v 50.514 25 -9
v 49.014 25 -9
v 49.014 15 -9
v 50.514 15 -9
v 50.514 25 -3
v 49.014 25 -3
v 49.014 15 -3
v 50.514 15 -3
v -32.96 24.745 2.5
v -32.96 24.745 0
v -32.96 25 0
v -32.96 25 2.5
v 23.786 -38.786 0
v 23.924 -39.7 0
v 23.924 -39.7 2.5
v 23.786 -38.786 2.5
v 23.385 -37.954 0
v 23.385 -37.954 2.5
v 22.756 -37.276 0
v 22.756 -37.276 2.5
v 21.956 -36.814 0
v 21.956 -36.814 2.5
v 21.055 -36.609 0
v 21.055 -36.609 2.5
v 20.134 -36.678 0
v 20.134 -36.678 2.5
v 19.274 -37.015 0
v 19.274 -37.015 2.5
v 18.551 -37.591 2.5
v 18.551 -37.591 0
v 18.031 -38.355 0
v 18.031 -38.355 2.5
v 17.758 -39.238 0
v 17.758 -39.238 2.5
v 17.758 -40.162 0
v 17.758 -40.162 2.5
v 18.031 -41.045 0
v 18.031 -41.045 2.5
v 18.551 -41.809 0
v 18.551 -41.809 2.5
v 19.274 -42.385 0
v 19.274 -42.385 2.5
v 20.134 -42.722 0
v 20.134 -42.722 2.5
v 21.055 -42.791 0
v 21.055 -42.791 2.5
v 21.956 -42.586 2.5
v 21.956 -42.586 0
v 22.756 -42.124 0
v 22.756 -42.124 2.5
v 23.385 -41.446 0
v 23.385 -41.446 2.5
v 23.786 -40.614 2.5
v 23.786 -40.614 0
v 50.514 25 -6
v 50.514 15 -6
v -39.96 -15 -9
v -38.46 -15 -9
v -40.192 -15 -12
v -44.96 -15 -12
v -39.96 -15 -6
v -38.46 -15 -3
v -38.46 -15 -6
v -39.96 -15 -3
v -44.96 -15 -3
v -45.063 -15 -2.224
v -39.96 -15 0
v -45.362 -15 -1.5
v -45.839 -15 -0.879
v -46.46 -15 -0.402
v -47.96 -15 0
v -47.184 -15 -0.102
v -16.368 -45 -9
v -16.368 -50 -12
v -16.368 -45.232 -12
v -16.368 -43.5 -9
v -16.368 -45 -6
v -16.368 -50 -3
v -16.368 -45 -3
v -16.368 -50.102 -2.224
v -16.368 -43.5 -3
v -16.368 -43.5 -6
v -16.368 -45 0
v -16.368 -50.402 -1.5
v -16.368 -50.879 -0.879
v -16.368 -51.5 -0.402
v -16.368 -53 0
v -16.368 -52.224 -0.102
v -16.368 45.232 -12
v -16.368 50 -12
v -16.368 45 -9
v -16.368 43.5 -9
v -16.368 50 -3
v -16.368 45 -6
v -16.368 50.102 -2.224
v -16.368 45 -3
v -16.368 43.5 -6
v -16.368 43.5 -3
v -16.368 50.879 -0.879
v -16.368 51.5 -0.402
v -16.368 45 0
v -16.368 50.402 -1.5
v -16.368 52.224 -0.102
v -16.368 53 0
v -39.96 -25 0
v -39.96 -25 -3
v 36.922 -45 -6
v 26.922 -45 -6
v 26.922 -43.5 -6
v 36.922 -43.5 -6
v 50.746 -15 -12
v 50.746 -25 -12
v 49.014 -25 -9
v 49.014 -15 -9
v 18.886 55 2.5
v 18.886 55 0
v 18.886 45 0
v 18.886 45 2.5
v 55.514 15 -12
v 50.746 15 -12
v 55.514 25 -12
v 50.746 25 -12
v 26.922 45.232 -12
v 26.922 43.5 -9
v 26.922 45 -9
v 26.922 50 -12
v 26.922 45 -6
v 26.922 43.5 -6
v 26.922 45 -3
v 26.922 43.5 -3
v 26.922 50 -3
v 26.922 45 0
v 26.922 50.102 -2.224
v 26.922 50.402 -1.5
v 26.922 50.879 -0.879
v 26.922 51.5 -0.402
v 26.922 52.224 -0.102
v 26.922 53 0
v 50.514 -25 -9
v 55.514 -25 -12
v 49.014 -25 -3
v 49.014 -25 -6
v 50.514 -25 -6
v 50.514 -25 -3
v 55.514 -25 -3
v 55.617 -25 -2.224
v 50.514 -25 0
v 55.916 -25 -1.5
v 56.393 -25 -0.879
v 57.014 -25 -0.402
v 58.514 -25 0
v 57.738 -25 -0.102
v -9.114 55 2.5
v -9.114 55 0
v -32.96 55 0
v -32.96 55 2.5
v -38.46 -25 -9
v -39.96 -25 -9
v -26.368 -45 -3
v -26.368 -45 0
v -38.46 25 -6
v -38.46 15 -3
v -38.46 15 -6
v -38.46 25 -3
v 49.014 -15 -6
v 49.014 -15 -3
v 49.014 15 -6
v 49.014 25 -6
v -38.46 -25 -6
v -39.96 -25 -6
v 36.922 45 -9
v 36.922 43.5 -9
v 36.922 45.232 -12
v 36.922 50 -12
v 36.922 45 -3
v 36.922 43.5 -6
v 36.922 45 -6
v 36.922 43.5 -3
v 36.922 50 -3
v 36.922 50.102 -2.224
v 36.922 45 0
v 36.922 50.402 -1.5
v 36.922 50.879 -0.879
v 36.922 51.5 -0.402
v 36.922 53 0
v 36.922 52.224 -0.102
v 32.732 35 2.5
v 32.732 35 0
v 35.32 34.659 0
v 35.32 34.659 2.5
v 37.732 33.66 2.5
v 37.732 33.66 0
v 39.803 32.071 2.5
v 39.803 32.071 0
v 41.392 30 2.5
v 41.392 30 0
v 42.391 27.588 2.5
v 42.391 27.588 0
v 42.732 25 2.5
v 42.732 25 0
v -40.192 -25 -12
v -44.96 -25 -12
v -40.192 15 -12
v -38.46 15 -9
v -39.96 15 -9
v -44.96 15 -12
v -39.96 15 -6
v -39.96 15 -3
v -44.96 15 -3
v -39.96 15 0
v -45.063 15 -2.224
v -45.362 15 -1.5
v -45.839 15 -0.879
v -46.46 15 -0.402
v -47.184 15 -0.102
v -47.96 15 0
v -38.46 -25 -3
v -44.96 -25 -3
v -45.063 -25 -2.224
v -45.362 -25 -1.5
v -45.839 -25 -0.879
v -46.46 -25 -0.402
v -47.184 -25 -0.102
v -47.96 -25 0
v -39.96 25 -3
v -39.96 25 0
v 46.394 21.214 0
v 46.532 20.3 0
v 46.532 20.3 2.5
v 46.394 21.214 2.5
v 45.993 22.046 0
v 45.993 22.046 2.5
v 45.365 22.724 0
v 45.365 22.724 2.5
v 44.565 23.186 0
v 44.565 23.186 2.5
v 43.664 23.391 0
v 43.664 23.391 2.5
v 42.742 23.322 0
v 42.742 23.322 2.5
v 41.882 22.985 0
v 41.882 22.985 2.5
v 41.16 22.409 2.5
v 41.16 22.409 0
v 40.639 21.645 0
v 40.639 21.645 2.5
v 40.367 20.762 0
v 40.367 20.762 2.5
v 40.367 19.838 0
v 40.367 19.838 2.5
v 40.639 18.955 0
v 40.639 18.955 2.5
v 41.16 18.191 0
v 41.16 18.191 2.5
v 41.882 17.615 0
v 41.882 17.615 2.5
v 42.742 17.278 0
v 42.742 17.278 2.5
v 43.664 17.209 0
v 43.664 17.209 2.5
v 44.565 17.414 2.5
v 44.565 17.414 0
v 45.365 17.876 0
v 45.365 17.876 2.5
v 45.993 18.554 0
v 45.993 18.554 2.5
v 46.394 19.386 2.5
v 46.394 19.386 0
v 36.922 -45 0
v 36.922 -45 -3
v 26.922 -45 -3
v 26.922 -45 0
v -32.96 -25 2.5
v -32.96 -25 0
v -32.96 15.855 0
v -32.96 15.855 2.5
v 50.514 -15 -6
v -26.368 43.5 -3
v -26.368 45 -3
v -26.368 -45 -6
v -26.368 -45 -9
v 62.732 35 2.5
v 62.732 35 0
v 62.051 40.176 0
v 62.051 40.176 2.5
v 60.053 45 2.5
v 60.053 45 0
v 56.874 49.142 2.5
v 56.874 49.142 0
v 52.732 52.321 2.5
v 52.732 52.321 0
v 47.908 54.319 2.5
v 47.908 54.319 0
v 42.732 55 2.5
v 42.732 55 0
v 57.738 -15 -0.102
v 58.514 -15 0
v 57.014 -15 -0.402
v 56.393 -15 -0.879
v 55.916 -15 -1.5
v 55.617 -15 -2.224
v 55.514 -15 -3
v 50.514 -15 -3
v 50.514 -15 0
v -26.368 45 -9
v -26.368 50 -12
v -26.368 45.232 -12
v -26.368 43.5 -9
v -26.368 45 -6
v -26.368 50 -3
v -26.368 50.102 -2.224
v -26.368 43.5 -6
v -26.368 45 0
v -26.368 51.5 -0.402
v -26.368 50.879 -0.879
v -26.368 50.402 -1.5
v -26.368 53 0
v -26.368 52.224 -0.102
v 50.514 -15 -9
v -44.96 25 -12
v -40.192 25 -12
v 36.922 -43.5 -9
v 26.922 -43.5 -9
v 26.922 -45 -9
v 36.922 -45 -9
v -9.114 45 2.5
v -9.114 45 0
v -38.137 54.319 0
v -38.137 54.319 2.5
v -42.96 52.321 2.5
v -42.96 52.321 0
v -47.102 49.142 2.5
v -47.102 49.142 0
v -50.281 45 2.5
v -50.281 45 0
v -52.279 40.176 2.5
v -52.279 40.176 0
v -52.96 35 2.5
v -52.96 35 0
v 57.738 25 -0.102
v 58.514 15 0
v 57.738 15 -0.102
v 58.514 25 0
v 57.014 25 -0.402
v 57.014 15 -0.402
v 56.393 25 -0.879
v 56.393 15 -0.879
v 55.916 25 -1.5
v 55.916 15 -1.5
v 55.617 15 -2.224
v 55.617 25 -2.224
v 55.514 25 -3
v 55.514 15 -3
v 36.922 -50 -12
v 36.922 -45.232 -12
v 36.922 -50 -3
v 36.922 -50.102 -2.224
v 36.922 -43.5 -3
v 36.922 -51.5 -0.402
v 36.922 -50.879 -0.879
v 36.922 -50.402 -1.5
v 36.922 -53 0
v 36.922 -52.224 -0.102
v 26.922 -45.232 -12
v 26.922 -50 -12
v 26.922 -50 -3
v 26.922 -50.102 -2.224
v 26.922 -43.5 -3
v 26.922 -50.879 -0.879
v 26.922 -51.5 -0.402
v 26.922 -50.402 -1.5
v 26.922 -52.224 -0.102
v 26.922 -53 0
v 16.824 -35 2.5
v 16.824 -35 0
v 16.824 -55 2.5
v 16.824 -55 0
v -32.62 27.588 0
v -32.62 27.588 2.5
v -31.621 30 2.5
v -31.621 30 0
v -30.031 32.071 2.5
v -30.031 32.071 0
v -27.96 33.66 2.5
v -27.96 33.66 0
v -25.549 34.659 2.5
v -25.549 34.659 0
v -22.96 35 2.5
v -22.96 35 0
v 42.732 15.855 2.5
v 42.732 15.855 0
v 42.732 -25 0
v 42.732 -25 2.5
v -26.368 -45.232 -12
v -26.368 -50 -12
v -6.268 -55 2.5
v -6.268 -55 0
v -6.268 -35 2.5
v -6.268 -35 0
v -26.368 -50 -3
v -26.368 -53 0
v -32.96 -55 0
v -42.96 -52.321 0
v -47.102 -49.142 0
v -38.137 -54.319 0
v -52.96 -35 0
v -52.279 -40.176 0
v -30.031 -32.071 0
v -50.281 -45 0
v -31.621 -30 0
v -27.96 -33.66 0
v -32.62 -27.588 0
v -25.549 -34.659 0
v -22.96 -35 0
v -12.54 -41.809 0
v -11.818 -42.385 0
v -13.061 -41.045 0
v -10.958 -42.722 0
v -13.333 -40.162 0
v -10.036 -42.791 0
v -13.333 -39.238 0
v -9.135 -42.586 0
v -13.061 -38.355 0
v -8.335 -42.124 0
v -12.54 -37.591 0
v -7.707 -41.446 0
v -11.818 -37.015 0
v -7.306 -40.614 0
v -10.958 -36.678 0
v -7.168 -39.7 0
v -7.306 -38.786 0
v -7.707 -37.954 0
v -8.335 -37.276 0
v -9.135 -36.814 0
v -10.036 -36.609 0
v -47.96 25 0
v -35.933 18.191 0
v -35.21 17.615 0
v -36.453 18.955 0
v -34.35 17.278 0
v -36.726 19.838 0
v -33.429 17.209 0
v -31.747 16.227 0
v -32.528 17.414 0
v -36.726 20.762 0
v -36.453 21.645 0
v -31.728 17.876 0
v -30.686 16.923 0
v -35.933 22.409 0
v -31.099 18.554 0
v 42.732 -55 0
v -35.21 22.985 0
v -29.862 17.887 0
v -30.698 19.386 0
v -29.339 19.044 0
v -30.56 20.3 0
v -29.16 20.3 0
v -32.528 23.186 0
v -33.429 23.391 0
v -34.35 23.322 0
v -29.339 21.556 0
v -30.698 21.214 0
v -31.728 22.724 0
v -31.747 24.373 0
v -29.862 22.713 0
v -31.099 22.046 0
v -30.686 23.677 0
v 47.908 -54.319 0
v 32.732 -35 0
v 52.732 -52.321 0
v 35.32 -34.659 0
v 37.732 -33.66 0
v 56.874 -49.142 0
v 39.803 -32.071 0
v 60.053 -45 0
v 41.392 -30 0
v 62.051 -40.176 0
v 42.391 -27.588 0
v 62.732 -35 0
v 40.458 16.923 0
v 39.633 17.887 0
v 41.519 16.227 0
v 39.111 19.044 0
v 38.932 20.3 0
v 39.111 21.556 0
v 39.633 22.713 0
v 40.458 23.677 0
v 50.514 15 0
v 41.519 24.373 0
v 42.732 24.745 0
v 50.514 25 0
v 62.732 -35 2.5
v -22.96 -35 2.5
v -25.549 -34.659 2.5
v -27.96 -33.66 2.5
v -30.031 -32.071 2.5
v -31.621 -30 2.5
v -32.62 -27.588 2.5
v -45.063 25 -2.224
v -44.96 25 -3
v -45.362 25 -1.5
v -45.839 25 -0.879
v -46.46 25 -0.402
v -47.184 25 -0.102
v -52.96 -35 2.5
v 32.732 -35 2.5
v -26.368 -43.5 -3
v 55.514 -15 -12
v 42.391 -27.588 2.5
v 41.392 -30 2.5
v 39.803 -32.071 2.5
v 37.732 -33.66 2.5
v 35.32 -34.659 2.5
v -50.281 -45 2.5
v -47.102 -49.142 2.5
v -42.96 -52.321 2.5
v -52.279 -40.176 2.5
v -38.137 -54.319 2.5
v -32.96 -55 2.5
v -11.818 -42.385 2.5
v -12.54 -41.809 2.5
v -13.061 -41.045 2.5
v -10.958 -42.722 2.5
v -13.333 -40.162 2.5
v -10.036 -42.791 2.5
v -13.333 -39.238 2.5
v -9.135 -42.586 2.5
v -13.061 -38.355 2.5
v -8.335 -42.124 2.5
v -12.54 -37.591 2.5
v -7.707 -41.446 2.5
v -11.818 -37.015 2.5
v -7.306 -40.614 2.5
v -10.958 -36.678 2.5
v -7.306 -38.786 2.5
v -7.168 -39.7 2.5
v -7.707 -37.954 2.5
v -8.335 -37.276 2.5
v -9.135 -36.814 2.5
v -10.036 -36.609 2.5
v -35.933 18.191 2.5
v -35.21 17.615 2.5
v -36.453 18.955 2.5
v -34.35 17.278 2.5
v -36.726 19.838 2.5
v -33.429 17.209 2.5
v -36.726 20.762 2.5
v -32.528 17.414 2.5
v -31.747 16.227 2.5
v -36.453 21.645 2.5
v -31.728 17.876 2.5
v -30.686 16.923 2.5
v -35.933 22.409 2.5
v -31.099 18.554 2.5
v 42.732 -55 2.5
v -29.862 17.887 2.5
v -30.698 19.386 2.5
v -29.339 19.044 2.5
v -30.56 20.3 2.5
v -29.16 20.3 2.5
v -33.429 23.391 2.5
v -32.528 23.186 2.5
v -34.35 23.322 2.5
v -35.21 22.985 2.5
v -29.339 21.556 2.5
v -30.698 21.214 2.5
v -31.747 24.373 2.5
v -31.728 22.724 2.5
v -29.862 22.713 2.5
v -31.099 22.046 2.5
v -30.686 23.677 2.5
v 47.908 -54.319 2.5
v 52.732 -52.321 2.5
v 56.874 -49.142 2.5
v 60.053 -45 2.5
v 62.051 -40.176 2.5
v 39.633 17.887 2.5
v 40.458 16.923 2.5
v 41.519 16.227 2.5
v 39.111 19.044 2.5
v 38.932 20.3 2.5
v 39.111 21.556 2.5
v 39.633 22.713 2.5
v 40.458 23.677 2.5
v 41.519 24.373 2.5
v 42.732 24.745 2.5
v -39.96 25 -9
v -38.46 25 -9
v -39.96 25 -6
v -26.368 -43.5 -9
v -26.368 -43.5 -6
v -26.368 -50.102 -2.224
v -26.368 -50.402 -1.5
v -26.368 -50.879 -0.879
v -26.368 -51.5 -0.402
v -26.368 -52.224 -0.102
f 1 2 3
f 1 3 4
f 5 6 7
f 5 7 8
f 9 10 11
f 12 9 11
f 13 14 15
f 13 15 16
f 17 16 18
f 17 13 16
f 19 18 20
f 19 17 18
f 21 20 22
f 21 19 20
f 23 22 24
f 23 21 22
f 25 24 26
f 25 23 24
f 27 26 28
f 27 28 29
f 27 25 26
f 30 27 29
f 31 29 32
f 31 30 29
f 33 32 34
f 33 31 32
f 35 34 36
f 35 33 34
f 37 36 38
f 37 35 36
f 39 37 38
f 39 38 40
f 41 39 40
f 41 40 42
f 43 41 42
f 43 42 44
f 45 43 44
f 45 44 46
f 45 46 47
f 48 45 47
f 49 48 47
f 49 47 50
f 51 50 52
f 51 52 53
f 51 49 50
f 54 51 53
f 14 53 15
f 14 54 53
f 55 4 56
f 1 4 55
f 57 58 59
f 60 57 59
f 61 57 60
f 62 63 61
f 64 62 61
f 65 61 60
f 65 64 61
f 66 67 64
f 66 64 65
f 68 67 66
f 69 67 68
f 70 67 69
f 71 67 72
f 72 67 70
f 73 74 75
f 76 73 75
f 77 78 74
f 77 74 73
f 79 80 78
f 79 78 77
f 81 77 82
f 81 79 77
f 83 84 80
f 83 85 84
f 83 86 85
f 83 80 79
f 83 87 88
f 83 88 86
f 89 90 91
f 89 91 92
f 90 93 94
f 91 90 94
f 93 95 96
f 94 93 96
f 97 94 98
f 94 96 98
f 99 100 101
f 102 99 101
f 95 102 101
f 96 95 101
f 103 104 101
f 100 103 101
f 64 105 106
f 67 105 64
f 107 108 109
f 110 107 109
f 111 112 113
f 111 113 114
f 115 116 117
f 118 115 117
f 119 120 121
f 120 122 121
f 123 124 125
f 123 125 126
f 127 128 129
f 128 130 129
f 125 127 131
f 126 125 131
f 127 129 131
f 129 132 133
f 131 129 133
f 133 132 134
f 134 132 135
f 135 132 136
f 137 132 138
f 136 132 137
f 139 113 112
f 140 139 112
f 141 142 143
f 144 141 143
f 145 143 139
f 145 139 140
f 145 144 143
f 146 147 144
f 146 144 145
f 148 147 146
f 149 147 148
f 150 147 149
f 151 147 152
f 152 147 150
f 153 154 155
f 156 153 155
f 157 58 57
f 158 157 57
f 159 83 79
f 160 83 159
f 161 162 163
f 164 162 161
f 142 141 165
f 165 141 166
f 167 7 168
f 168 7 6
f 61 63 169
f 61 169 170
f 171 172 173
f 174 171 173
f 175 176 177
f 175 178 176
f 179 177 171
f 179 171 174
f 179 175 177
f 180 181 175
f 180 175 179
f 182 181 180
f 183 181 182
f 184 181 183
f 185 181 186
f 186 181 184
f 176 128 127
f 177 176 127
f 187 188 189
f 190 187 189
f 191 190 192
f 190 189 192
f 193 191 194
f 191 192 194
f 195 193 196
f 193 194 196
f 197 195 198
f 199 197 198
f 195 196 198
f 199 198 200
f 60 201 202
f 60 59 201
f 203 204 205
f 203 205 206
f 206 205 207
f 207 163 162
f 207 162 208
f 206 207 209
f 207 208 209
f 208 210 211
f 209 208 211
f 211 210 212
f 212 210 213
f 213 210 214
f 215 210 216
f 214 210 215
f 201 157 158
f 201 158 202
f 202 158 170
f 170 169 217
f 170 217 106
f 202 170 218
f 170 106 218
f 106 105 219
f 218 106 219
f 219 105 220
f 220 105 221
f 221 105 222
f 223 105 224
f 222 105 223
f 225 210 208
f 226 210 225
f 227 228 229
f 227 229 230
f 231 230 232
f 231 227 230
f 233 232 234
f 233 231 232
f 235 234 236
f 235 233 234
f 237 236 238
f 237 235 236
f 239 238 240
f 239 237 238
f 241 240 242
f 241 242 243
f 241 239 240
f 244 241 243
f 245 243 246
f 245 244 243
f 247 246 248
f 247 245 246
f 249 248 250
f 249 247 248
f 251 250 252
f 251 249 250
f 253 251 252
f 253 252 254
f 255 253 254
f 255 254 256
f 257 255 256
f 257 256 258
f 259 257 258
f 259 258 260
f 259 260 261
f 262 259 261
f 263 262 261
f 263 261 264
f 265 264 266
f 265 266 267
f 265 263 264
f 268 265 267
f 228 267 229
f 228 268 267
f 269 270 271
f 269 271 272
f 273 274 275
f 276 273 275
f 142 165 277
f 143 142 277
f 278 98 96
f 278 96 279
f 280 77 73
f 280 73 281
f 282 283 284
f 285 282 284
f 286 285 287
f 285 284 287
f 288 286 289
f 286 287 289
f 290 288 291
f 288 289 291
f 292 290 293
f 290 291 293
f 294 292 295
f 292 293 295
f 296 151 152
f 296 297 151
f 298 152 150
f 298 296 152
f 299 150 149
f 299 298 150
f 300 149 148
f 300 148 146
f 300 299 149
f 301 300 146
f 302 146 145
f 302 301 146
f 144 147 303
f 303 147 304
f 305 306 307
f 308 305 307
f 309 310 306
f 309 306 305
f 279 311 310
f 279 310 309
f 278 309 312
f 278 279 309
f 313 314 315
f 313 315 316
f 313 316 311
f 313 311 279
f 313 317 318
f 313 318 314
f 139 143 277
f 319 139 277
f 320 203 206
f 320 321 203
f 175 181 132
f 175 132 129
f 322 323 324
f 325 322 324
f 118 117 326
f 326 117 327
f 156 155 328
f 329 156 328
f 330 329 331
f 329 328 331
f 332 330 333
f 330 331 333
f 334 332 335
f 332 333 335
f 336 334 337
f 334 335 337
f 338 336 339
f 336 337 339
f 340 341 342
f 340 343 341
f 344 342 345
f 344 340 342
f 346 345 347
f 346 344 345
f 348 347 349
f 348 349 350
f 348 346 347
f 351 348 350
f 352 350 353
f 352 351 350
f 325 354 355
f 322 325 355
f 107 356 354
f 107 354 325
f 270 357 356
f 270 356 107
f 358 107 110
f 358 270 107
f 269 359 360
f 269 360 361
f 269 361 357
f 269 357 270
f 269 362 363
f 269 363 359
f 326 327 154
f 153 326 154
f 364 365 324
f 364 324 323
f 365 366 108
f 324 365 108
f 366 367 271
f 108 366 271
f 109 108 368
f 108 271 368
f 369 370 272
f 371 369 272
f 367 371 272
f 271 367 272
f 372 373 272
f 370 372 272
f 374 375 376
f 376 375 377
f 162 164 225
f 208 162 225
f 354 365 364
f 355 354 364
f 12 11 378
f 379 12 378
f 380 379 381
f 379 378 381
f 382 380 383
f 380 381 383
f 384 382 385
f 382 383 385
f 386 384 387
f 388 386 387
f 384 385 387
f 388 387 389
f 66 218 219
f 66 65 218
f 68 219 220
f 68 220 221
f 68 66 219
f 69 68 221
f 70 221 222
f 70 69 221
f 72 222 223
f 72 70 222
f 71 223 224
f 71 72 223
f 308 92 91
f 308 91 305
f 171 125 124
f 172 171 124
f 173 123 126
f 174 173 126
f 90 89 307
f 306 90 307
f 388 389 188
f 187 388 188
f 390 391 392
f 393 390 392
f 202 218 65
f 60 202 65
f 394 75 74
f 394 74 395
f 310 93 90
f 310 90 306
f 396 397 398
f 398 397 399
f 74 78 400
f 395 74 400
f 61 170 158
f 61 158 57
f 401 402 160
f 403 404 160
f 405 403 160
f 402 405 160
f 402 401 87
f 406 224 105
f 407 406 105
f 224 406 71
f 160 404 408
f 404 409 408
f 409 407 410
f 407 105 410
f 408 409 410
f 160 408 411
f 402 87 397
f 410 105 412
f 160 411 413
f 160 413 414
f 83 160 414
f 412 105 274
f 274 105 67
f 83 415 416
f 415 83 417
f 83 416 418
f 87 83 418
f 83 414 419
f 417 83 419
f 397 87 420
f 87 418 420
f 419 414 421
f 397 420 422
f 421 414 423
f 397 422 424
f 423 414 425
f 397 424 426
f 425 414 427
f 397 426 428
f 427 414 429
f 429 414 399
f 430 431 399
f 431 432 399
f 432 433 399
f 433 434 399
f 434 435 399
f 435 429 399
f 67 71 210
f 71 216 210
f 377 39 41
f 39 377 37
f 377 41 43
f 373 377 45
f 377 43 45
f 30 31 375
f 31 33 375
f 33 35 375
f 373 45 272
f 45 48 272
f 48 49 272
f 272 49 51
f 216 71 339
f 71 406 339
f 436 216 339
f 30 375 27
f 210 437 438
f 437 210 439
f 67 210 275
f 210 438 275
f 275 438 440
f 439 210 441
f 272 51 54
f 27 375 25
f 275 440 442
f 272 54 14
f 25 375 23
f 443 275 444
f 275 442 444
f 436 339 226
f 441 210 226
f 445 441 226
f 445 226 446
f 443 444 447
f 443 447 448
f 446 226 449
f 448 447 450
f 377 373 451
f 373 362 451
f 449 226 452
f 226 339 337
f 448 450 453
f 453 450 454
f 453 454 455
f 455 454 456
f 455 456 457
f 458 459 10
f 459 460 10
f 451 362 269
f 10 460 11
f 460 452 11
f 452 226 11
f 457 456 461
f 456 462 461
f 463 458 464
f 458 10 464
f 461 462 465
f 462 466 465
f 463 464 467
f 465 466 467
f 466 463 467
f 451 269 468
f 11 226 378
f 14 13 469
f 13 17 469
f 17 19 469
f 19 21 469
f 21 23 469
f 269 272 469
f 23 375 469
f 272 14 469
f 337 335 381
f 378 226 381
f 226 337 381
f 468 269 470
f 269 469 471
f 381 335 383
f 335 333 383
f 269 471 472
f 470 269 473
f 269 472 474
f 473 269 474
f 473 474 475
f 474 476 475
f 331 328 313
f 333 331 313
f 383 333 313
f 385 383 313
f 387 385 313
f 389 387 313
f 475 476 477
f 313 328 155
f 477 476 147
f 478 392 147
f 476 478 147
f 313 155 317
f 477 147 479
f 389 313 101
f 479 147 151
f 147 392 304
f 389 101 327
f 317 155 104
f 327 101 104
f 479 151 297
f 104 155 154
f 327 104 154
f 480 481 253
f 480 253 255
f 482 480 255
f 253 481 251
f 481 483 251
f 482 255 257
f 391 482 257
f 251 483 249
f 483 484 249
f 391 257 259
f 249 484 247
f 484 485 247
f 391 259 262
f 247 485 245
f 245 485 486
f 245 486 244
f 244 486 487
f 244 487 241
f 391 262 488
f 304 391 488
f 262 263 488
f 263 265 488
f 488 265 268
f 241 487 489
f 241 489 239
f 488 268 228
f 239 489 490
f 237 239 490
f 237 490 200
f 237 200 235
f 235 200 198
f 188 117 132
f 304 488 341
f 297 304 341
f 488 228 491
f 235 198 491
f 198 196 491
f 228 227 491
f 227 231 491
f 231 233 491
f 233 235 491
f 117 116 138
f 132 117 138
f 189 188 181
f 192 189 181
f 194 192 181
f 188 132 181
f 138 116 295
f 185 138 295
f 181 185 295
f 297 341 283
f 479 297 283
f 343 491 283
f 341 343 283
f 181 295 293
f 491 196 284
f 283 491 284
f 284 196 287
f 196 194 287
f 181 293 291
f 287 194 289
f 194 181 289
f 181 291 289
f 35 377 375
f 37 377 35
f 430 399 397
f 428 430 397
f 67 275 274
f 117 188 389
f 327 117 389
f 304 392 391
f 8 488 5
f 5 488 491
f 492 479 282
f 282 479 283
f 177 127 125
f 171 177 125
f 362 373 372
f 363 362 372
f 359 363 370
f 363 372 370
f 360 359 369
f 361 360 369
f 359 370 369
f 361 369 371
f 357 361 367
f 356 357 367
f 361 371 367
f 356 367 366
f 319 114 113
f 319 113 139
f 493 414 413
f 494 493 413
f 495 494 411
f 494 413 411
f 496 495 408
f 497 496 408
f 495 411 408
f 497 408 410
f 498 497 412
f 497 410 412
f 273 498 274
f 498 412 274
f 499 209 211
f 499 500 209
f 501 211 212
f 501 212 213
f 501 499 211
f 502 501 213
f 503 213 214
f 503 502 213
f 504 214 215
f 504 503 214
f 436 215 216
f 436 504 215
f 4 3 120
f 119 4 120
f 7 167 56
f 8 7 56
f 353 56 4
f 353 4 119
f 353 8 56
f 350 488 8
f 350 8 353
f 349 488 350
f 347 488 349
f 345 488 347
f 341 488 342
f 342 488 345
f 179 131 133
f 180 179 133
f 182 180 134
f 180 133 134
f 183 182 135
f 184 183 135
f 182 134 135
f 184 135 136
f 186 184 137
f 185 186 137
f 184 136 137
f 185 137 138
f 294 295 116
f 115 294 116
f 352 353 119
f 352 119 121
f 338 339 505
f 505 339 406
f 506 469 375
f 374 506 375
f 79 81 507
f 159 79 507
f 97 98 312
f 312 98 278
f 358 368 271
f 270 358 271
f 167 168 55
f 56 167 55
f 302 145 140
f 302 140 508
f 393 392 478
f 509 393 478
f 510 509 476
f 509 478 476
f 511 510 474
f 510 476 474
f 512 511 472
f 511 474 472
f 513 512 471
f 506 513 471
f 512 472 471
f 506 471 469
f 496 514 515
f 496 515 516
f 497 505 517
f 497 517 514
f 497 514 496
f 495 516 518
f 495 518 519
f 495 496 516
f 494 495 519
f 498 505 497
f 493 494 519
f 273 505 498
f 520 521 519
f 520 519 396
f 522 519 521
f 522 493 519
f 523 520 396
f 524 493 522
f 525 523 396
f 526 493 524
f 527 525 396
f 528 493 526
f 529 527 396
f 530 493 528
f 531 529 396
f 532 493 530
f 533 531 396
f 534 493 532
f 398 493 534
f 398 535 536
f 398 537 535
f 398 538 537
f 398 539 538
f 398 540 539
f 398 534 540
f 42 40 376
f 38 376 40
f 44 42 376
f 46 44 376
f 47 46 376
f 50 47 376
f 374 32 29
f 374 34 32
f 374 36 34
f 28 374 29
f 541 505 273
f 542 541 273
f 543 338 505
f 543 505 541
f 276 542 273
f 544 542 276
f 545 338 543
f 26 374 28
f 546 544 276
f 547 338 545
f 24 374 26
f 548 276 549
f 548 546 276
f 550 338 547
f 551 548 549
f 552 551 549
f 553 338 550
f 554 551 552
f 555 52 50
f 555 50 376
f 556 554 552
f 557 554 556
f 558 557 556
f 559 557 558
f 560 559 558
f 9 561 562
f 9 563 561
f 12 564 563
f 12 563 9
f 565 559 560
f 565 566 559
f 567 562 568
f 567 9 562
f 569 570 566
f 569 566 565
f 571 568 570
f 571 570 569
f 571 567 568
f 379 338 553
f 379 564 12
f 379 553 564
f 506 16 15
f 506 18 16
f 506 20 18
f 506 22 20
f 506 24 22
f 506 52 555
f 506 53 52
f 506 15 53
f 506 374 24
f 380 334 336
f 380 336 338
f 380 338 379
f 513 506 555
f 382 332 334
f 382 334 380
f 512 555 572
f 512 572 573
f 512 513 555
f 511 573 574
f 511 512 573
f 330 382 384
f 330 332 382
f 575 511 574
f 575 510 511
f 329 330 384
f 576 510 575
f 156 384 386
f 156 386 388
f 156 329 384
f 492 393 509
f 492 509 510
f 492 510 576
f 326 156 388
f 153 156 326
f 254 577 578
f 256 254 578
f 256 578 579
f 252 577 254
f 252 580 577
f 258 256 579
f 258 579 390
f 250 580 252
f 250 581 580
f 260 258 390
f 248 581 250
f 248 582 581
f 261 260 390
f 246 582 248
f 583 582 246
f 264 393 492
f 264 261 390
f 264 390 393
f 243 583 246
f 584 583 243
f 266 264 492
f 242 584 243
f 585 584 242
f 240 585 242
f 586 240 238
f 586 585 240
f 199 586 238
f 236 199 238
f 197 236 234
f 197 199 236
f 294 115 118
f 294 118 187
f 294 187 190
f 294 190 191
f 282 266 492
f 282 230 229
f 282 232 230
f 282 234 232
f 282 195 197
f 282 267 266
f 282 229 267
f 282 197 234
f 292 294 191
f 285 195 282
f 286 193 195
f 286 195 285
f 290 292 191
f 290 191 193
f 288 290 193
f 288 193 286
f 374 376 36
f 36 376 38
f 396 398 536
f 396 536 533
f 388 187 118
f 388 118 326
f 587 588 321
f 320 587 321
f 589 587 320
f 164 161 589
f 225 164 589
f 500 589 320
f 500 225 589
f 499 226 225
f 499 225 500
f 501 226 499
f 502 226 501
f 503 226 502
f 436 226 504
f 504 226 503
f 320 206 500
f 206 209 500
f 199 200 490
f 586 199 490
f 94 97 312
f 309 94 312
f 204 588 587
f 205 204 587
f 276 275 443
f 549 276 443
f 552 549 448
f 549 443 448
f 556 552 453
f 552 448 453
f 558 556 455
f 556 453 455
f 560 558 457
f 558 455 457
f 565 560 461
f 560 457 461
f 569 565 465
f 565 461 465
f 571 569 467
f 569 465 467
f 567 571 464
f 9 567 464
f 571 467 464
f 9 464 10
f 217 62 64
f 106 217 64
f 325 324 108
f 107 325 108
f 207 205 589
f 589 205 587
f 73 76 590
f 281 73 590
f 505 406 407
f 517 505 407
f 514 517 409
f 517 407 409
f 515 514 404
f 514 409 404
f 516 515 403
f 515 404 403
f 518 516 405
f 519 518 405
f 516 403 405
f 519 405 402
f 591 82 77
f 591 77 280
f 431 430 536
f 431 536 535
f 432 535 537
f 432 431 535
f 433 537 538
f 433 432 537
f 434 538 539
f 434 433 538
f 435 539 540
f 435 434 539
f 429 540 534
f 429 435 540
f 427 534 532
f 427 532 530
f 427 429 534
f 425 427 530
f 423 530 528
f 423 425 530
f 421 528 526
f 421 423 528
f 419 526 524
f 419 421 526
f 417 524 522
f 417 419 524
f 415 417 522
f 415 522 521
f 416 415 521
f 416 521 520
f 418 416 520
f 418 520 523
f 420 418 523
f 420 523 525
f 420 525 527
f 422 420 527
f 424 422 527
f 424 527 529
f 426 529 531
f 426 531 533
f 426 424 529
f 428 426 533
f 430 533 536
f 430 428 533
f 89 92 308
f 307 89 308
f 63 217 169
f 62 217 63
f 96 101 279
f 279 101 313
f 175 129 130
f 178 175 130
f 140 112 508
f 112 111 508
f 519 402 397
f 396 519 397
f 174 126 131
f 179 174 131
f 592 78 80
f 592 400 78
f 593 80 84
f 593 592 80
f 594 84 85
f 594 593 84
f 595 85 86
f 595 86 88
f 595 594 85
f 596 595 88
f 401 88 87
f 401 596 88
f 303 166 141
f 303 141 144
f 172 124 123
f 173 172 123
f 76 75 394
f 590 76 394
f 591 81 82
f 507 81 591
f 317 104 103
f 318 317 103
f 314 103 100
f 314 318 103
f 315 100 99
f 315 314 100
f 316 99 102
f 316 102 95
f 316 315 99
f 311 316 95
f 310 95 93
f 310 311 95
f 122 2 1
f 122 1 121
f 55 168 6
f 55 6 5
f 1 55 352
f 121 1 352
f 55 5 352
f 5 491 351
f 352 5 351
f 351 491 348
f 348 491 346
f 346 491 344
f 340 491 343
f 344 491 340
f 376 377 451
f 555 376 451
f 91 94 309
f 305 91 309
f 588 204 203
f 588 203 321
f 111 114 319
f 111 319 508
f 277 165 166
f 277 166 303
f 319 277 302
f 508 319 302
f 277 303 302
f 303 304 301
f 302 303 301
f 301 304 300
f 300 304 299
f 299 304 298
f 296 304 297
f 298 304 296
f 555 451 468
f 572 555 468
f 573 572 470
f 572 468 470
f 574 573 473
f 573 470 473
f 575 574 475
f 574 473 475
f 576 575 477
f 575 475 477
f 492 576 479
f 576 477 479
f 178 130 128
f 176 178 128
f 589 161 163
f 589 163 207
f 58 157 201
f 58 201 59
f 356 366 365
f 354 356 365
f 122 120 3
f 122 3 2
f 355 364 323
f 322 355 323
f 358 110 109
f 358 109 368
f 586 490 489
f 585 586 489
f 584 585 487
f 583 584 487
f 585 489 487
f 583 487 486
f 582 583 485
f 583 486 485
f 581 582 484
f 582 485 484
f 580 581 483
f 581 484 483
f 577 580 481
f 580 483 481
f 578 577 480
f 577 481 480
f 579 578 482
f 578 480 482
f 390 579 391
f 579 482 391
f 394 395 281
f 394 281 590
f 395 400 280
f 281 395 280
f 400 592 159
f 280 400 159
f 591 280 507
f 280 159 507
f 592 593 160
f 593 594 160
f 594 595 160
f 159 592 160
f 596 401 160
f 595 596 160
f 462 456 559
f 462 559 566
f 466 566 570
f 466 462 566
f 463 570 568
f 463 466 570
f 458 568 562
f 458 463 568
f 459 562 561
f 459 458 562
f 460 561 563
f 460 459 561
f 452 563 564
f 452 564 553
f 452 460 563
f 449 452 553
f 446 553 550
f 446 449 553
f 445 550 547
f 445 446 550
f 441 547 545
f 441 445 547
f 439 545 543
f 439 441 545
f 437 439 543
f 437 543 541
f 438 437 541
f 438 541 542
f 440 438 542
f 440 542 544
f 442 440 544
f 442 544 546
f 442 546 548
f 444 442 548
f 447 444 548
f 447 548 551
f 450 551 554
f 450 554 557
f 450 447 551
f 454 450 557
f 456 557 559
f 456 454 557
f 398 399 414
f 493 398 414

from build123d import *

# Parameters (mm, degrees)
CROQUIS1_R                  = 3.1
SALIENTE_EXTRUIR1_DEPTH     = 2.5
CROQUIS2_W                  = 6.5
CROQUIS2_H                  = 10
SALIENTE_EXTRUIR3_DEPTH     = 6
CROQUIS5_W                  = 1.5
CROQUIS5_H                  = 10
CORTAR_EXTRUIR2_DEPTH       = 3
SALIENTE_EXTRUIR4_START     = -3
CROQUIS6_W                  = 5
CROQUIS6_H                  = 10
SALIENTE_EXTRUIR4_DEPTH     = 4
REDONDEO1_R                 = 3
CROQUIS7_W                  = 6.5
CROQUIS7_H                  = 10
SALIENTE_EXTRUIR5_DEPTH     = 3
CHAFL_N1_SIZE2              = 3
CHAFL_N1_SIZE               = 1.732050808
CROQUIS8_W                  = 5
CROQUIS8_H                  = 10
SALIENTE_EXTRUIR6_DEPTH     = 3
CROQUIS9_W                  = 6.5
CROQUIS9_H                  = 10
SALIENTE_EXTRUIR7_DEPTH     = 3
REDONDEO2_R                 = 3
CHAFL_N2_SIZE2              = 3
CHAFL_N2_SIZE               = 1.732050808
REDONDEO1_OF_SIMETR_A1_R    = 3
CHAFL_N1_OF_SIMETR_A1_SIZE2 = 1.732050808
CHAFL_N1_OF_SIMETR_A1_SIZE  = 3
REDONDEO2_OF_SIMETR_A1_R    = 3
CHAFL_N2_OF_SIMETR_A1_SIZE2 = 1.732050808
CHAFL_N2_OF_SIMETR_A1_SIZE  = 3
CROQUIS10_W                 = 10
CROQUIS10_H                 = 6.5
SALIENTE_EXTRUIR9_DEPTH     = 6
CROQUIS12_W                 = 10
CROQUIS12_H                 = 1.5
CORTAR_EXTRUIR6_DEPTH       = 3
CROQUIS13_W                 = 10
CROQUIS13_H                 = 5
SALIENTE_EXTRUIR10_DEPTH    = 3
CROQUIS14_W                 = 10
CROQUIS14_H                 = 6.5
SALIENTE_EXTRUIR11_DEPTH    = 3
REDONDEO3_R                 = 3
CHAFL_N3_SIZE2              = 1.732050808
CHAFL_N3_SIZE               = 3
REDONDEO3_OF_SIMETR_A2_R    = 3
CHAFL_N3_OF_SIMETR_A2_SIZE2 = 3
CHAFL_N3_OF_SIMETR_A2_SIZE  = 1.732050808
SIMETR_A3_START             = 26.922069807
SIMETR_A3_DEPTH             = 10


# Read off the part's stored shape, not the designer's step: Simetría3
with BuildPart() as part:
    # Croquis1 → Saliente-Extruir1 (new body)
    with BuildSketch(Plane.XY):
        with BuildLine():
            Line((32.732069807, -35), (16.823581959, -35))
            Line((16.823581959, -35), (16.823581959, -55))
            Line((16.823581959, -55), (42.732069807, -55))
            ThreePointArc((42.732069807, -55), (56.874205431, -49.142135624), (62.732069807, -35))
            Line((62.732069807, -35), (62.732069807, 35))
            ThreePointArc((62.732069807, 35), (56.874205431, 49.142135624), (42.732069807, 55))
            Line((42.732069807, 55), (18.885856119, 55))
            Line((18.885856119, 55), (18.885856119, 45))
            Line((18.885856119, 45), (-9.114143881, 45))
            Line((-9.114143881, 45), (-9.114143881, 55))
            Line((-9.114143881, 55), (-32.96035757, 55))
            ThreePointArc((-32.96035757, 55), (-47.102493193, 49.142135624), (-52.96035757, 35))
            Line((-52.96035757, 35), (-52.96035757, -35))
            ThreePointArc((-52.96035757, -35), (-47.102493193, -49.142135624), (-32.96035757, -55))
            Line((-32.96035757, -55), (-6.267930193, -55))
            Line((-6.267930193, -55), (-6.267930193, -35))
            Line((-6.267930193, -35), (-22.96035757, -35))
            ThreePointArc((-22.96035757, -35), (-30.031425382, -32.071067812), (-32.96035757, -25))
            Line((-32.96035757, -25), (-32.96035757, 15.854777846))
            ThreePointArc((-32.96035757, 15.854777846), (-29.16035757, 20.3), (-32.96035757, 24.745222154))
            Line((-32.96035757, 24.745222154), (-32.96035757, 25))
            ThreePointArc((-32.96035757, 25), (-30.031425382, 32.071067812), (-22.96035757, 35))
            Line((-22.96035757, 35), (32.732069807, 35))
            ThreePointArc((32.732069807, 35), (39.803137619, 32.071067812), (42.732069807, 25))
            Line((42.732069807, 25), (42.732069807, 24.745222154))
            ThreePointArc((42.732069807, 24.745222154), (38.932069807, 20.3), (42.732069807, 15.854777846))
            Line((42.732069807, 15.854777846), (42.732069807, -25))
            ThreePointArc((42.732069807, -25), (39.803137619, -32.071067812), (32.732069807, -35))
        make_face()
        with Locations((20.823581959, -39.7)):
            Circle(CROQUIS1_R, mode=Mode.SUBTRACT)
        with Locations((-10.267930193, -39.7)):
            Circle(CROQUIS1_R, mode=Mode.SUBTRACT)
        with Locations((43.432069807, 20.3)):
            Circle(CROQUIS1_R, mode=Mode.SUBTRACT)
        with Locations((-33.66035757, 20.3)):
            Circle(CROQUIS1_R, mode=Mode.SUBTRACT)
    extrude(amount=SALIENTE_EXTRUIR1_DEPTH)

    # Croquis2 → Saliente-Extruir3 (add)
    with BuildSketch(Plane(origin=(0, 0, 0), x_dir=(-1, 0, 0), z_dir=(0, 0, -1))):
        with Locations((41.71035757, -20)):
            Rectangle(CROQUIS2_W, CROQUIS2_H)
        with Locations((41.71035757, 20)):
            Rectangle(CROQUIS2_W, CROQUIS2_H)
    saliente_extruir3 = extrude(amount=SALIENTE_EXTRUIR3_DEPTH)

    # Croquis5 → Cortar-Extruir2 (cut)
    with BuildSketch(Plane(origin=(0, 0, 0), x_dir=(-1, 0, 0), z_dir=(0, 0, -1))):
        with Locations((39.21035757, -20)):
            Rectangle(CROQUIS5_W, CROQUIS5_H)
        with Locations((39.21035757, 20)):
            Rectangle(CROQUIS5_W, CROQUIS5_H)
    cortar_extruir2 = extrude(amount=CORTAR_EXTRUIR2_DEPTH, mode=Mode.SUBTRACT)

    # Croquis6 → Saliente-Extruir4 (add)
    with BuildSketch(Plane(origin=(-38.46035757, 25, -6), x_dir=(1, 0, 0), z_dir=(0, 0, 1)).offset(SALIENTE_EXTRUIR4_START)):
        with Locations((-4, -5)):
            Rectangle(CROQUIS6_W, CROQUIS6_H)
    saliente_extruir4 = extrude(amount=SALIENTE_EXTRUIR4_DEPTH)

    # Redondeo1
    redondeo1_edges = [part.edges().sort_by_distance(p)[0] for p in [
        (-44.96035757, 20, 0),
    ]]
    fillet(redondeo1_edges, radius=REDONDEO1_R)

    # Croquis7 → Saliente-Extruir5 (add)
    with BuildSketch(Plane(origin=(0, 0, -9), x_dir=(-1, 0, 0), z_dir=(0, 0, -1))):
        with Locations((41.71035757, 20)):
            Rectangle(CROQUIS7_W, CROQUIS7_H)
    saliente_extruir5 = extrude(amount=SALIENTE_EXTRUIR5_DEPTH)

    # Chaflán1
    chafl_n1_edges = [part.edges().sort_by_distance(p)[0] for p in [
        (-38.46035757, 20, -12),
    ]]
    chafl_n1_side = [part.faces().sort_by_distance(p)[0] for p in [
        (-38.494998586, 20, -12),
    ]]
    chamfer(chafl_n1_edges, length=CHAFL_N1_SIZE - 0.0001, length2=CHAFL_N1_SIZE2 - 0.0001, reference=chafl_n1_side[0])  # a hair under: the kernel refuses the full size

    # Croquis8 → Saliente-Extruir6 (add)
    with BuildSketch(Plane(origin=(0, 0, -6), x_dir=(-1, 0, 0), z_dir=(0, 0, -1))):
        with Locations((42.46035757, -20)):
            Rectangle(CROQUIS8_W, CROQUIS8_H)
    saliente_extruir6 = extrude(amount=SALIENTE_EXTRUIR6_DEPTH)

    # Croquis9 → Saliente-Extruir7 (add)
    with BuildSketch(Plane(origin=(0, 0, -9), x_dir=(-1, 0, 0), z_dir=(0, 0, -1))):
        with Locations((41.71035757, -20)):
            Rectangle(CROQUIS9_W, CROQUIS9_H)
    saliente_extruir7 = extrude(amount=SALIENTE_EXTRUIR7_DEPTH)

    # Redondeo2
    redondeo2_edges = [part.edges().sort_by_distance(p)[0] for p in [
        (-44.96035757, -20, 0),
    ]]
    fillet(redondeo2_edges, radius=REDONDEO2_R)

    # Chaflán2
    chafl_n2_edges = [part.edges().sort_by_distance(p)[0] for p in [
        (-38.46035757, -20, -12),
    ]]
    chafl_n2_side = [part.faces().sort_by_distance(p)[0] for p in [
        (-38.494998586, -20, -12),
    ]]
    chamfer(chafl_n2_edges, length=CHAFL_N2_SIZE - 0.0001, length2=CHAFL_N2_SIZE2 - 0.0001, reference=chafl_n2_side[0])  # a hair under: the kernel refuses the full size

    # Simetría1: Saliente-Extruir3, Cortar-Extruir2, Saliente-Extruir4, Saliente-Extruir5, Saliente-Extruir6, Saliente-Extruir7 across plane
    add(saliente_extruir3.mirror(Plane(origin=(5.277069807, 0, 0), x_dir=(0, 0, 1), z_dir=(1, 0, 0))))
    add(cortar_extruir2.mirror(Plane(origin=(5.277069807, 0, 0), x_dir=(0, 0, 1), z_dir=(1, 0, 0))), mode=Mode.SUBTRACT)
    add(saliente_extruir4.mirror(Plane(origin=(5.277069807, 0, 0), x_dir=(0, 0, 1), z_dir=(1, 0, 0))))
    add(saliente_extruir5.mirror(Plane(origin=(5.277069807, 0, 0), x_dir=(0, 0, 1), z_dir=(1, 0, 0))))
    add(saliente_extruir6.mirror(Plane(origin=(5.277069807, 0, 0), x_dir=(0, 0, 1), z_dir=(1, 0, 0))))
    add(saliente_extruir7.mirror(Plane(origin=(5.277069807, 0, 0), x_dir=(0, 0, 1), z_dir=(1, 0, 0))))

    # Redondeo1 of Simetría1
    redondeo1_of_simetr_a1_edges = [part.edges().sort_by_distance(p)[0] for p in [
        (55.514497184, 20, 0),
    ]]
    fillet(redondeo1_of_simetr_a1_edges, radius=REDONDEO1_OF_SIMETR_A1_R)

    # Chaflán1 of Simetría1
    chafl_n1_of_simetr_a1_edges = [part.edges().sort_by_distance(p)[0] for p in [
        (49.014497184, 20, -12),
    ]]
    chafl_n1_of_simetr_a1_side = [part.faces().sort_by_distance(p)[0] for p in [
        (49.014497184, 20, -11.965358984),
    ]]
    chamfer(chafl_n1_of_simetr_a1_edges, length=CHAFL_N1_OF_SIMETR_A1_SIZE - 0.0001, length2=CHAFL_N1_OF_SIMETR_A1_SIZE2 - 0.0001, reference=chafl_n1_of_simetr_a1_side[0])  # a hair under: the kernel refuses the full size

    # Redondeo2 of Simetría1
    redondeo2_of_simetr_a1_edges = [part.edges().sort_by_distance(p)[0] for p in [
        (55.514497184, -20, 0),
    ]]
    fillet(redondeo2_of_simetr_a1_edges, radius=REDONDEO2_OF_SIMETR_A1_R)

    # Chaflán2 of Simetría1
    chafl_n2_of_simetr_a1_edges = [part.edges().sort_by_distance(p)[0] for p in [
        (49.014497184, -20, -12),
    ]]
    chafl_n2_of_simetr_a1_side = [part.faces().sort_by_distance(p)[0] for p in [
        (49.014497184, -20, -11.965358984),
    ]]
    chamfer(chafl_n2_of_simetr_a1_edges, length=CHAFL_N2_OF_SIMETR_A1_SIZE - 0.0001, length2=CHAFL_N2_OF_SIMETR_A1_SIZE2 - 0.0001, reference=chafl_n2_of_simetr_a1_side[0])  # a hair under: the kernel refuses the full size

    # Croquis10 → Saliente-Extruir9 (add)
    with BuildSketch(Plane(origin=(0, 0, 0), x_dir=(-1, 0, 0), z_dir=(0, 0, -1))):
        with Locations((21.367930193, -46.75)):
            Rectangle(CROQUIS10_W, CROQUIS10_H)
    saliente_extruir9 = extrude(amount=SALIENTE_EXTRUIR9_DEPTH)

    # Croquis12 → Cortar-Extruir6 (cut)
    with BuildSketch(Plane(origin=(0, 0, 0), x_dir=(-1, 0, 0), z_dir=(0, 0, -1))):
        with Locations((21.367930193, -44.25)):
            Rectangle(CROQUIS12_W, CROQUIS12_H)
    cortar_extruir6 = extrude(amount=CORTAR_EXTRUIR6_DEPTH, mode=Mode.SUBTRACT)

    # Croquis13 → Saliente-Extruir10 (add)
    with BuildSketch(Plane(origin=(0, 0, -6), x_dir=(-1, 0, 0), z_dir=(0, 0, -1))):
        with Locations((21.367930193, -47.5)):
            Rectangle(CROQUIS13_W, CROQUIS13_H)
    saliente_extruir10 = extrude(amount=SALIENTE_EXTRUIR10_DEPTH)

    # Croquis14 → Saliente-Extruir11 (add)
    with BuildSketch(Plane(origin=(0, 0, -9), x_dir=(-1, 0, 0), z_dir=(0, 0, -1))):
        with Locations((21.367930193, -46.75)):
            Rectangle(CROQUIS14_W, CROQUIS14_H)
    saliente_extruir11 = extrude(amount=SALIENTE_EXTRUIR11_DEPTH)

    # Redondeo3
    redondeo3_edges = [part.edges().sort_by_distance(p)[0] for p in [
        (-21.367930193, -50, 0),
    ]]
    fillet(redondeo3_edges, radius=REDONDEO3_R)

    # Chaflán3
    chafl_n3_edges = [part.edges().sort_by_distance(p)[0] for p in [
        (-21.367930193, -43.5, -12),
    ]]
    chafl_n3_side = [part.faces().sort_by_distance(p)[0] for p in [
        (-21.367930193, -43.5, -11.965358984),
    ]]
    chamfer(chafl_n3_edges, length=CHAFL_N3_SIZE - 0.0001, length2=CHAFL_N3_SIZE2 - 0.0001, reference=chafl_n3_side[0])  # a hair under: the kernel refuses the full size

    # Simetría2: Saliente-Extruir9, Cortar-Extruir6, Saliente-Extruir10, Saliente-Extruir11 across plane
    add(saliente_extruir9.mirror(Plane.ZX))
    add(cortar_extruir6.mirror(Plane.ZX), mode=Mode.SUBTRACT)
    add(saliente_extruir10.mirror(Plane.ZX))
    add(saliente_extruir11.mirror(Plane.ZX))

    # Redondeo3 of Simetría2
    redondeo3_of_simetr_a2_edges = [part.edges().sort_by_distance(p)[0] for p in [
        (-21.367930193, 50, 0),
    ]]
    fillet(redondeo3_of_simetr_a2_edges, radius=REDONDEO3_OF_SIMETR_A2_R)

    # Chaflán3 of Simetría2
    chafl_n3_of_simetr_a2_edges = [part.edges().sort_by_distance(p)[0] for p in [
        (-21.367930193, 43.5, -12),
    ]]
    chafl_n3_of_simetr_a2_side = [part.faces().sort_by_distance(p)[0] for p in [
        (-21.367930193, 43.534641016, -12),
    ]]
    chamfer(chafl_n3_of_simetr_a2_edges, length=CHAFL_N3_OF_SIMETR_A2_SIZE - 0.0001, length2=CHAFL_N3_OF_SIMETR_A2_SIZE2 - 0.0001, reference=chafl_n3_of_simetr_a2_side[0])  # a hair under: the kernel refuses the full size

    # Simetría3 outline → Simetría3 (add)
    with BuildSketch(Plane.YZ.offset(SIMETR_A3_START)):
        with BuildLine():
            Line((-45, -3), (-45, 0))
            Line((-45, 0), (-53, 0))
            ThreePointArc((-53, 0), (-50.878679656, -0.878679656), (-50, -3))
            Line((-50, -3), (-50, -12))
            Line((-50, -12), (-45.232050808, -12))
            Line((-45.232050808, -12), (-43.5, -9))
            Line((-43.5, -9), (-45, -9))
            Line((-45, -9), (-45, -6))
            Line((-45, -6), (-43.5, -6))
            Line((-43.5, -6), (-43.5, -3))
            Line((-43.5, -3), (-45, -3))
        make_face()
        with BuildLine():
            Line((43.5, -6), (45, -6))
            Line((45, -6), (45, -9))
            Line((45, -9), (43.5, -9))
            Line((43.5, -9), (45.232050808, -12))
            Line((45.232050808, -12), (50, -12))
            Line((50, -12), (50, -3))
            ThreePointArc((50, -3), (50.878679656, -0.878679656), (53, 0))
            Line((53, 0), (45, 0))
            Line((45, 0), (45, -3))
            Line((45, -3), (43.5, -3))
            Line((43.5, -3), (43.5, -6))
        make_face()
    extrude(amount=SIMETR_A3_DEPTH)


solid = part.part
